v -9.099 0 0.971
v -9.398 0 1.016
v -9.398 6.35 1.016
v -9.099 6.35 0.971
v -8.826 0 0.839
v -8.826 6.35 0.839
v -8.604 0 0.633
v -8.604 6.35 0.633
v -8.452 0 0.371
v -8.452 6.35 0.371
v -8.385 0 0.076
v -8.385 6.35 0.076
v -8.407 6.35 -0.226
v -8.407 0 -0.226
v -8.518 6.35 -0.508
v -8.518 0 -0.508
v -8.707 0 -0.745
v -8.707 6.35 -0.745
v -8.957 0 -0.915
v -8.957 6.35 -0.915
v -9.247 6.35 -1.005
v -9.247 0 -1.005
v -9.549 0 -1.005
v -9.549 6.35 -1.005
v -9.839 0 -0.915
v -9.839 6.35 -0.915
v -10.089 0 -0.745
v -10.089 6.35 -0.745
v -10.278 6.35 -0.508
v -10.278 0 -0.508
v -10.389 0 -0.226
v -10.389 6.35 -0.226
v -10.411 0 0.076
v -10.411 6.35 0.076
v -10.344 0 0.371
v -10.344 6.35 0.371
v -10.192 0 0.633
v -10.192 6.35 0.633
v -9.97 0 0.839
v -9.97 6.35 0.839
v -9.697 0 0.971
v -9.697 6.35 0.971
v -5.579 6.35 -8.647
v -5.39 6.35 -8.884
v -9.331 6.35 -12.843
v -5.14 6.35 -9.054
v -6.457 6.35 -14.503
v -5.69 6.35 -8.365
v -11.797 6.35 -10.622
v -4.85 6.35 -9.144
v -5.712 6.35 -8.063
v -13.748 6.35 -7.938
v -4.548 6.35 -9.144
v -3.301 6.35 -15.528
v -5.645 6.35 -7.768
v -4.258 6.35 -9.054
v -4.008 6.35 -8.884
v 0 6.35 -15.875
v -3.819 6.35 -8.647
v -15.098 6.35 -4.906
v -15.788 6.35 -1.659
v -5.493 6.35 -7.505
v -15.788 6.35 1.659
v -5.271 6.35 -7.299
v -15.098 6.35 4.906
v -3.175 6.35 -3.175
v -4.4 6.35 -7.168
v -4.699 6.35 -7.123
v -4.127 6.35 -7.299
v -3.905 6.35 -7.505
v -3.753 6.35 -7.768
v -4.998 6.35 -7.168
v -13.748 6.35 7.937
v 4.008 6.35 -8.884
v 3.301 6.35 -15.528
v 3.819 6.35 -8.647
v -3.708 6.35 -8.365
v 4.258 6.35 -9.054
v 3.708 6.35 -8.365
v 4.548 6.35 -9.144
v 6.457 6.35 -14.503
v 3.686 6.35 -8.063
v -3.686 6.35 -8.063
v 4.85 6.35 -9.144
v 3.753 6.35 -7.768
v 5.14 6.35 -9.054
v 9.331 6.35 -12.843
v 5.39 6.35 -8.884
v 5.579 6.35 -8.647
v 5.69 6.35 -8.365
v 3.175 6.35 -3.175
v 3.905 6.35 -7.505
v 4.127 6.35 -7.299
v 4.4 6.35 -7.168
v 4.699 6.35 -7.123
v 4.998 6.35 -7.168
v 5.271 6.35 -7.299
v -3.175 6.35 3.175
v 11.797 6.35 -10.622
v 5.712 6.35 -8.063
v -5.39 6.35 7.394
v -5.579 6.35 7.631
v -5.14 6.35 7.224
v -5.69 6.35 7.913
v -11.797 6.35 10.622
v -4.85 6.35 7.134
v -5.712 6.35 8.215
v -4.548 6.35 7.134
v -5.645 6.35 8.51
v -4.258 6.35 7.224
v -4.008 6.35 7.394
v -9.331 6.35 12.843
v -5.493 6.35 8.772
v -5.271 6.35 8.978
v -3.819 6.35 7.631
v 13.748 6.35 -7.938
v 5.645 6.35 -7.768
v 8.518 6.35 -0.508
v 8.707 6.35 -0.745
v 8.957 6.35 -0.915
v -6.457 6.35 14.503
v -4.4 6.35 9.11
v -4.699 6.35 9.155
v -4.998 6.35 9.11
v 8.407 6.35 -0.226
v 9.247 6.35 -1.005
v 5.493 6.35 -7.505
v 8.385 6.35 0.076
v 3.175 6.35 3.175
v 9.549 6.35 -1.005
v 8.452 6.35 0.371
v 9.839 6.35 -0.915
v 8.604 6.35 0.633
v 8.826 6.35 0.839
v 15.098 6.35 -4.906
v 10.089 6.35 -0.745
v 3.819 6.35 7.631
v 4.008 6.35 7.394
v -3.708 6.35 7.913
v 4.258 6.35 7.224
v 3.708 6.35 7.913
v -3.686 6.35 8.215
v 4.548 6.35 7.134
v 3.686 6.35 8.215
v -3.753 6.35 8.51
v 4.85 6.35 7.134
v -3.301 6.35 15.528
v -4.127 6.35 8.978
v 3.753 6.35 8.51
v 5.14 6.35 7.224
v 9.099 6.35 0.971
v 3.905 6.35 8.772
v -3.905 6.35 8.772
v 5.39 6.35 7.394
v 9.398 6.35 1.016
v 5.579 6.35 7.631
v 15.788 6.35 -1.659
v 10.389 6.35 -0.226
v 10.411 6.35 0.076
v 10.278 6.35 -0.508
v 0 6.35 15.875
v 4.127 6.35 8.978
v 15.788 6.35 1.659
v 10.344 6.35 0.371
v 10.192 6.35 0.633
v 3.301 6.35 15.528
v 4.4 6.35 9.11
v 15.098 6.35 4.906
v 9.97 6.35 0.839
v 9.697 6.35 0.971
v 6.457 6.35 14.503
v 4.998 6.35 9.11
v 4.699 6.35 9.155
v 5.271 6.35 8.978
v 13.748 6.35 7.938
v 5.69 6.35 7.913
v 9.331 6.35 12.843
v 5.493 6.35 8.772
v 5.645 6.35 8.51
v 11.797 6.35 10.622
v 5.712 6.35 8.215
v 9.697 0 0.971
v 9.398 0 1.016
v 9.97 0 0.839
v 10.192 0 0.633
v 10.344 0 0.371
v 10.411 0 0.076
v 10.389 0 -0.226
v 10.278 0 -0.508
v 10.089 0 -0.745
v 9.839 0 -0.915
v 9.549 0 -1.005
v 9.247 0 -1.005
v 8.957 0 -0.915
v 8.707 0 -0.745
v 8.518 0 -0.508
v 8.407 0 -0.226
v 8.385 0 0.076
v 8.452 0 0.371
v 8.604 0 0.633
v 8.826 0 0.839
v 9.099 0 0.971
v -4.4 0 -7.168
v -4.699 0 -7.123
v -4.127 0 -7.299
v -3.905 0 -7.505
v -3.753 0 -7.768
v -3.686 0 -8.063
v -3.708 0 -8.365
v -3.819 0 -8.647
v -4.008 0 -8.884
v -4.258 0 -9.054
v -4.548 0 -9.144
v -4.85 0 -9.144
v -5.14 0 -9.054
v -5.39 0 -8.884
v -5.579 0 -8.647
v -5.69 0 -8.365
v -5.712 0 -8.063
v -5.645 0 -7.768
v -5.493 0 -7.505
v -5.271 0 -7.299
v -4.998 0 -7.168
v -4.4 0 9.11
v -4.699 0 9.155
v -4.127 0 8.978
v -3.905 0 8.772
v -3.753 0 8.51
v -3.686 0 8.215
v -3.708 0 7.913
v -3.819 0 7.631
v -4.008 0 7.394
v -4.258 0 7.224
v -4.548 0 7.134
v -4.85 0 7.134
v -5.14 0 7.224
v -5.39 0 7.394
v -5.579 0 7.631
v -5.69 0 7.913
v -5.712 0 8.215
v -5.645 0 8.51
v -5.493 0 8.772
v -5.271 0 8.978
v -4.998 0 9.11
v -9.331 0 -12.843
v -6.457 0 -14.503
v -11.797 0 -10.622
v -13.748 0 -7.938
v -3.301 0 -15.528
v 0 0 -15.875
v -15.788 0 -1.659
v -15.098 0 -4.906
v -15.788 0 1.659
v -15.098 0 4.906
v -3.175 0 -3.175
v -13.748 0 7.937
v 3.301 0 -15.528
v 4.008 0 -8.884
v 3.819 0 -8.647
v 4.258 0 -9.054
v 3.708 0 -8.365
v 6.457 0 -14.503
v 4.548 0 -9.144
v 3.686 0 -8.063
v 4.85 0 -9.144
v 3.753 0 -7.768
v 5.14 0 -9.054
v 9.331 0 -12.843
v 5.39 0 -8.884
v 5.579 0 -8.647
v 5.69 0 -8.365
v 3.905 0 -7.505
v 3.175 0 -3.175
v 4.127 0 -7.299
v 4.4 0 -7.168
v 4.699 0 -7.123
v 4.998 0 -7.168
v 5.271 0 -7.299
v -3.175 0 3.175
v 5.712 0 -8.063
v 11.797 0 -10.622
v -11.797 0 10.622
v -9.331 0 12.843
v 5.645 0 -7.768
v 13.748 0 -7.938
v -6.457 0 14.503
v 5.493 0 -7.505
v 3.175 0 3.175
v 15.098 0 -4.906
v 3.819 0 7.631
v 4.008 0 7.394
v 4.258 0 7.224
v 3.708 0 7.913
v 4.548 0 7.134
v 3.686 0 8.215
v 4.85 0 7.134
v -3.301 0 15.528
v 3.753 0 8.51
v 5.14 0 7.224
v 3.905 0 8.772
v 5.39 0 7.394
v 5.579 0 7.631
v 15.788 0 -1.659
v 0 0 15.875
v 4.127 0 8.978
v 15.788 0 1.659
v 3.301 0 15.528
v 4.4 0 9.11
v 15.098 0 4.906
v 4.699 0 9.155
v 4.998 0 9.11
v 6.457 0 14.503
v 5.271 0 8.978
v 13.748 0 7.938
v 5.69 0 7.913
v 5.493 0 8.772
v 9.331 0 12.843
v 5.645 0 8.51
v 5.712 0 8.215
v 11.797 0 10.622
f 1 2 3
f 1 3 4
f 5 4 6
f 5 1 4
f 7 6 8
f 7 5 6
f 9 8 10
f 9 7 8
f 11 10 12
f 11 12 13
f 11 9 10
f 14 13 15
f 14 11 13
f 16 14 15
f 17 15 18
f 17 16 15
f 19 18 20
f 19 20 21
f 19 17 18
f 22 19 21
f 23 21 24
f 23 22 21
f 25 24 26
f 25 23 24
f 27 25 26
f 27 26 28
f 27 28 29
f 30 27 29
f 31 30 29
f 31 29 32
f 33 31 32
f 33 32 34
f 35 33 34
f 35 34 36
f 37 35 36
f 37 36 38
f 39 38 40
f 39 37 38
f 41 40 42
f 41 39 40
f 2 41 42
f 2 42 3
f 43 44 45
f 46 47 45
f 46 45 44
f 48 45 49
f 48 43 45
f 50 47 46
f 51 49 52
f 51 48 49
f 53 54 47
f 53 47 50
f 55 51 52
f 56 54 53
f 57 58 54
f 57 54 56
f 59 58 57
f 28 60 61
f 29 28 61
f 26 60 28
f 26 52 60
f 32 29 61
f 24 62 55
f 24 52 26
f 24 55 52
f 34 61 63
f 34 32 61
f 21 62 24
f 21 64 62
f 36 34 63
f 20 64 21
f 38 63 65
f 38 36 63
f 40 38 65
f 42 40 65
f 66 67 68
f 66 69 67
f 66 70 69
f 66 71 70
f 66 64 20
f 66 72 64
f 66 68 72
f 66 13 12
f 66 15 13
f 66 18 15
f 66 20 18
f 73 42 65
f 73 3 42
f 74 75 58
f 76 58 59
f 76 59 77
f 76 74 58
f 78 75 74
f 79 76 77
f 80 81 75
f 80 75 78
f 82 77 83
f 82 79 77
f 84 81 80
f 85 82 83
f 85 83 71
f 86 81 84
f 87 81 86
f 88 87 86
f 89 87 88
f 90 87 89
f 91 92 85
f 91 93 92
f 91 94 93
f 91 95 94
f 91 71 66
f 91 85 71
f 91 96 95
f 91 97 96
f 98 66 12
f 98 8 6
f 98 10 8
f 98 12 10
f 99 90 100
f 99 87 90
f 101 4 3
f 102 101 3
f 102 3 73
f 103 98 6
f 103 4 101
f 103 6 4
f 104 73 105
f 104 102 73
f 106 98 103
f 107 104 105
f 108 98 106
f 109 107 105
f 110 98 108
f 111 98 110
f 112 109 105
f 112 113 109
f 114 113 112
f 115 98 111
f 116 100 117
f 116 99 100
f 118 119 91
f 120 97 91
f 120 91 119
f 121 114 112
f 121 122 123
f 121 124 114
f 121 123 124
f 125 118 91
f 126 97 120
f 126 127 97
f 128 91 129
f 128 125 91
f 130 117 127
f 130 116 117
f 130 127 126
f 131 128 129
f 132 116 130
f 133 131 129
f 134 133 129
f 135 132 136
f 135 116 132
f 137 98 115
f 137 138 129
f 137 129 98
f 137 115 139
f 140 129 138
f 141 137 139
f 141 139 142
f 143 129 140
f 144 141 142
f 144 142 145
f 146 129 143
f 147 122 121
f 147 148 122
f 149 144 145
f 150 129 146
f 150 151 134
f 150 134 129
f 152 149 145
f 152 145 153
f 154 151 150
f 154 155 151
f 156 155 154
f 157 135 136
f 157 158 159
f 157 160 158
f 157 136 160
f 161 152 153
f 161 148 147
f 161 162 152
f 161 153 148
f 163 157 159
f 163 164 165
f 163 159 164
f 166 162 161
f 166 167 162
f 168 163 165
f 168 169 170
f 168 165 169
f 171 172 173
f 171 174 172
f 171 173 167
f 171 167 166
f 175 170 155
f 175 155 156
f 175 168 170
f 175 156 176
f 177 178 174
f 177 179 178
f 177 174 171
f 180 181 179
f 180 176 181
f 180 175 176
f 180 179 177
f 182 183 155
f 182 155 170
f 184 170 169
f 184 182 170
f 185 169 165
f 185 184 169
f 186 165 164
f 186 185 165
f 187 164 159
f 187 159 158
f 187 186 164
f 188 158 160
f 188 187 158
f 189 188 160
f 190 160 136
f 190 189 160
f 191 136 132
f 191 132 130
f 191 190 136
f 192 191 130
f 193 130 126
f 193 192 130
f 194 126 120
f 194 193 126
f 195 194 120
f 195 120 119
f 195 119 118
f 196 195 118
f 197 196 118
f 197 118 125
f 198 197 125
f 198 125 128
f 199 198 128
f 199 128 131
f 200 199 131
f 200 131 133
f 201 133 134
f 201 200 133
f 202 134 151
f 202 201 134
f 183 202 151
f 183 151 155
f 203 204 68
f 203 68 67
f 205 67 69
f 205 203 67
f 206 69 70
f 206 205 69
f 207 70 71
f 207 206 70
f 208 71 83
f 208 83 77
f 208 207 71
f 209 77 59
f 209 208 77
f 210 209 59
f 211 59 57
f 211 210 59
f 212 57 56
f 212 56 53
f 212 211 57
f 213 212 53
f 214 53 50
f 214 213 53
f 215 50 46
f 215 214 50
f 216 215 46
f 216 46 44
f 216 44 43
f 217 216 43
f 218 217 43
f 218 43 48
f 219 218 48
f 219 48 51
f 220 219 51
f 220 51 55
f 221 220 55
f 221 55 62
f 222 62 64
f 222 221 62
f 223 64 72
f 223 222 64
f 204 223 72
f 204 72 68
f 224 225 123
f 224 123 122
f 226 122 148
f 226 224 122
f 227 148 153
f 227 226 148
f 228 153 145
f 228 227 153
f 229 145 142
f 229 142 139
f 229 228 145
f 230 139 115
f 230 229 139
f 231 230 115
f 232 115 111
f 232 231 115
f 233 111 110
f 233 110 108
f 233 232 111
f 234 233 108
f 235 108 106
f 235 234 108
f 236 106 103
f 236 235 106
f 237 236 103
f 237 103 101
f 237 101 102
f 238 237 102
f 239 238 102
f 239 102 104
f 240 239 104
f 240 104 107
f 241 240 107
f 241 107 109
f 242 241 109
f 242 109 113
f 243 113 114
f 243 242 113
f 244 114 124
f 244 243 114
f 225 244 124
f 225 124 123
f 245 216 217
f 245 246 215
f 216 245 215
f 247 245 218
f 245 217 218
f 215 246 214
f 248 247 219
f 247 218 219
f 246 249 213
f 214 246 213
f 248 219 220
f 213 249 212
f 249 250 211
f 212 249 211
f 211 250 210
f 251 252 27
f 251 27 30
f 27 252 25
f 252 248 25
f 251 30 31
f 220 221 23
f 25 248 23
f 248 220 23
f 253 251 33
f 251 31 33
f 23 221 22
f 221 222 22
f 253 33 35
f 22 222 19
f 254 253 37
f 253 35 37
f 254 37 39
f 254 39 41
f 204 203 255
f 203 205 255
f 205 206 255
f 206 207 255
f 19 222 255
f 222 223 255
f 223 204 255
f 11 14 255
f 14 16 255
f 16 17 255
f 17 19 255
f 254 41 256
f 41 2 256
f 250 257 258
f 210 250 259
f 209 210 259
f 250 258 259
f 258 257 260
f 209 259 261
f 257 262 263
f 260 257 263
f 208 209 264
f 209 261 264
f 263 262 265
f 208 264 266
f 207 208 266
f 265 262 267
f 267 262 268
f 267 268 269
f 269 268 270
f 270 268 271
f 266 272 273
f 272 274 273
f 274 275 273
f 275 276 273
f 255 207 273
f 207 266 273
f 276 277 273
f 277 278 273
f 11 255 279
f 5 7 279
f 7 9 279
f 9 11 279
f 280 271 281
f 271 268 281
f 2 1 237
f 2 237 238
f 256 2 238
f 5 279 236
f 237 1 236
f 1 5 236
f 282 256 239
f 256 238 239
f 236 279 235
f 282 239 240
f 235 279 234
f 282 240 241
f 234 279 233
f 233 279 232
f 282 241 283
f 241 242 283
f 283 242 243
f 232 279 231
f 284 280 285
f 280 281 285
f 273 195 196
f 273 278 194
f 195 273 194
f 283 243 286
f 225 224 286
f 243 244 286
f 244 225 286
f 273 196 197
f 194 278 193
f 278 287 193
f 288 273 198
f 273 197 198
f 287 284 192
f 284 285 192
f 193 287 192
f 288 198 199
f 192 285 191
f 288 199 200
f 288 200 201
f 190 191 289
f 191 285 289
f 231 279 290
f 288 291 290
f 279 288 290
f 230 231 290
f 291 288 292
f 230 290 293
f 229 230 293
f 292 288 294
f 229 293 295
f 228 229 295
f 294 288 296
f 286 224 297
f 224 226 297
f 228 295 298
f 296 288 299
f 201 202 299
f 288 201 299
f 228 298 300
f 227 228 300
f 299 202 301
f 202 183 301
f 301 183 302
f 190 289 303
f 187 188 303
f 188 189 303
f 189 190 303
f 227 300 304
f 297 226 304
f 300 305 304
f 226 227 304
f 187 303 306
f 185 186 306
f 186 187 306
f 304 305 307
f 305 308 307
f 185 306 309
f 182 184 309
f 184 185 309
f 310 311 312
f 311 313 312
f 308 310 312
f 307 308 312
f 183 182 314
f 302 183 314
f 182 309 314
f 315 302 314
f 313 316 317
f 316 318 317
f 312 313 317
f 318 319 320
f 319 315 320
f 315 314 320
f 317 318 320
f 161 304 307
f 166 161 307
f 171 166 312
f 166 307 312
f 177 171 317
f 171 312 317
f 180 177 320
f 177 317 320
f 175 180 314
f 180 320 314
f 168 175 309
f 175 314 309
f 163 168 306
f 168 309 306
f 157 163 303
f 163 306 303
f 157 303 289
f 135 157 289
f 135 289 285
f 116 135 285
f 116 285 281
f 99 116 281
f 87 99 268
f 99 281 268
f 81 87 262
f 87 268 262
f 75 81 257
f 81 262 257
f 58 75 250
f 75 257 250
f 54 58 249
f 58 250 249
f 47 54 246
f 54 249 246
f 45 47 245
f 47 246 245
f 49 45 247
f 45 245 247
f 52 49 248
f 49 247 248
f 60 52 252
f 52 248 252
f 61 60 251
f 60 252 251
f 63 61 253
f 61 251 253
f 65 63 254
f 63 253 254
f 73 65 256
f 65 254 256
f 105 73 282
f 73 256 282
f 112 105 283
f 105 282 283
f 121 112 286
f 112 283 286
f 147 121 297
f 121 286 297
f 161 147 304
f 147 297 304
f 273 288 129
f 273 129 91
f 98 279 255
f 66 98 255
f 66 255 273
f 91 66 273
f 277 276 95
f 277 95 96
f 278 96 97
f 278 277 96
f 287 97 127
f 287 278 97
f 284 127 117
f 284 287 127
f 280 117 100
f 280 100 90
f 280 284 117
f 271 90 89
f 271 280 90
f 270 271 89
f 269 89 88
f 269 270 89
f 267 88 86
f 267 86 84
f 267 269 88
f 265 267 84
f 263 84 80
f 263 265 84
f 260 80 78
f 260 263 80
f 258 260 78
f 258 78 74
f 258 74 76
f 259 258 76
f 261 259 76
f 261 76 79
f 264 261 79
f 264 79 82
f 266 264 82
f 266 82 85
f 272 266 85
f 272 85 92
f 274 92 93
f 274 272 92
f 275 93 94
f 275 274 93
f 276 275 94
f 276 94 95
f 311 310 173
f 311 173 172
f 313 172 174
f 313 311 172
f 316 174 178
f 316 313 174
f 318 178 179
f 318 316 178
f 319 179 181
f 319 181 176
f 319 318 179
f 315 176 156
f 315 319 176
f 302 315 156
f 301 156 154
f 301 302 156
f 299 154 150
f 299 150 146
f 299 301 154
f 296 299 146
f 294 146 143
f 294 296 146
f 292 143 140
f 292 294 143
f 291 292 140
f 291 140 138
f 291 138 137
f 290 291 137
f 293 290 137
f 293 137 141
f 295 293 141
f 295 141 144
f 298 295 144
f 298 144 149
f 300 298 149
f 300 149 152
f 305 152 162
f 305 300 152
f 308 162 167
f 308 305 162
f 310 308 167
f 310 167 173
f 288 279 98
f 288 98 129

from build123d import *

# Parameters (mm, degrees)
ELEVATOR_SUPPORT_PULLEYS_R   = 15.875
ELEVATOR_SUPPORT_PULLEYS_R_2 = 1.016
ELEVATOR_SUPPORT_PULLEYS_W   = 6.35
ELEVATOR_SUPPORT_PULLEYS_H   = 6.35
BOSS_EXTRUDE1_DEPTH          = 6.35


with BuildPart() as part:
    # Elevator Support Pulleys → Boss-Extrude1 (new body)
    with BuildSketch(Plane(origin=(0, 0, 0), x_dir=(1, 0, 0), z_dir=(0, 1, 0))):
        with Locations(Location((0, 0, 0), (0, 0, 270))):
            Circle(ELEVATOR_SUPPORT_PULLEYS_R)
        with Locations(Location((9.398, 0, 0), (0, 0, 270))):
            Circle(ELEVATOR_SUPPORT_PULLEYS_R_2, mode=Mode.SUBTRACT)
        with Locations(Location((4.699, -8.138906745, 0), (0, 0, 270))):
            Circle(ELEVATOR_SUPPORT_PULLEYS_R_2, mode=Mode.SUBTRACT)
        with Locations(Location((-4.699, -8.138906745, 0), (0, 0, 270))):
            Circle(ELEVATOR_SUPPORT_PULLEYS_R_2, mode=Mode.SUBTRACT)
        with Locations(Location((-9.398, 0, 0), (0, 0, 270))):
            Circle(ELEVATOR_SUPPORT_PULLEYS_R_2, mode=Mode.SUBTRACT)
        with Locations(Location((-4.699, 8.138906745, 0), (0, 0, 270))):
            Circle(ELEVATOR_SUPPORT_PULLEYS_R_2, mode=Mode.SUBTRACT)
        with Locations(Location((4.699, 8.138906745, 0), (0, 0, 270))):
            Circle(ELEVATOR_SUPPORT_PULLEYS_R_2, mode=Mode.SUBTRACT)
        Rectangle(ELEVATOR_SUPPORT_PULLEYS_W, ELEVATOR_SUPPORT_PULLEYS_H, mode=Mode.SUBTRACT)
    extrude(amount=BOSS_EXTRUDE1_DEPTH)


solid = part.part
